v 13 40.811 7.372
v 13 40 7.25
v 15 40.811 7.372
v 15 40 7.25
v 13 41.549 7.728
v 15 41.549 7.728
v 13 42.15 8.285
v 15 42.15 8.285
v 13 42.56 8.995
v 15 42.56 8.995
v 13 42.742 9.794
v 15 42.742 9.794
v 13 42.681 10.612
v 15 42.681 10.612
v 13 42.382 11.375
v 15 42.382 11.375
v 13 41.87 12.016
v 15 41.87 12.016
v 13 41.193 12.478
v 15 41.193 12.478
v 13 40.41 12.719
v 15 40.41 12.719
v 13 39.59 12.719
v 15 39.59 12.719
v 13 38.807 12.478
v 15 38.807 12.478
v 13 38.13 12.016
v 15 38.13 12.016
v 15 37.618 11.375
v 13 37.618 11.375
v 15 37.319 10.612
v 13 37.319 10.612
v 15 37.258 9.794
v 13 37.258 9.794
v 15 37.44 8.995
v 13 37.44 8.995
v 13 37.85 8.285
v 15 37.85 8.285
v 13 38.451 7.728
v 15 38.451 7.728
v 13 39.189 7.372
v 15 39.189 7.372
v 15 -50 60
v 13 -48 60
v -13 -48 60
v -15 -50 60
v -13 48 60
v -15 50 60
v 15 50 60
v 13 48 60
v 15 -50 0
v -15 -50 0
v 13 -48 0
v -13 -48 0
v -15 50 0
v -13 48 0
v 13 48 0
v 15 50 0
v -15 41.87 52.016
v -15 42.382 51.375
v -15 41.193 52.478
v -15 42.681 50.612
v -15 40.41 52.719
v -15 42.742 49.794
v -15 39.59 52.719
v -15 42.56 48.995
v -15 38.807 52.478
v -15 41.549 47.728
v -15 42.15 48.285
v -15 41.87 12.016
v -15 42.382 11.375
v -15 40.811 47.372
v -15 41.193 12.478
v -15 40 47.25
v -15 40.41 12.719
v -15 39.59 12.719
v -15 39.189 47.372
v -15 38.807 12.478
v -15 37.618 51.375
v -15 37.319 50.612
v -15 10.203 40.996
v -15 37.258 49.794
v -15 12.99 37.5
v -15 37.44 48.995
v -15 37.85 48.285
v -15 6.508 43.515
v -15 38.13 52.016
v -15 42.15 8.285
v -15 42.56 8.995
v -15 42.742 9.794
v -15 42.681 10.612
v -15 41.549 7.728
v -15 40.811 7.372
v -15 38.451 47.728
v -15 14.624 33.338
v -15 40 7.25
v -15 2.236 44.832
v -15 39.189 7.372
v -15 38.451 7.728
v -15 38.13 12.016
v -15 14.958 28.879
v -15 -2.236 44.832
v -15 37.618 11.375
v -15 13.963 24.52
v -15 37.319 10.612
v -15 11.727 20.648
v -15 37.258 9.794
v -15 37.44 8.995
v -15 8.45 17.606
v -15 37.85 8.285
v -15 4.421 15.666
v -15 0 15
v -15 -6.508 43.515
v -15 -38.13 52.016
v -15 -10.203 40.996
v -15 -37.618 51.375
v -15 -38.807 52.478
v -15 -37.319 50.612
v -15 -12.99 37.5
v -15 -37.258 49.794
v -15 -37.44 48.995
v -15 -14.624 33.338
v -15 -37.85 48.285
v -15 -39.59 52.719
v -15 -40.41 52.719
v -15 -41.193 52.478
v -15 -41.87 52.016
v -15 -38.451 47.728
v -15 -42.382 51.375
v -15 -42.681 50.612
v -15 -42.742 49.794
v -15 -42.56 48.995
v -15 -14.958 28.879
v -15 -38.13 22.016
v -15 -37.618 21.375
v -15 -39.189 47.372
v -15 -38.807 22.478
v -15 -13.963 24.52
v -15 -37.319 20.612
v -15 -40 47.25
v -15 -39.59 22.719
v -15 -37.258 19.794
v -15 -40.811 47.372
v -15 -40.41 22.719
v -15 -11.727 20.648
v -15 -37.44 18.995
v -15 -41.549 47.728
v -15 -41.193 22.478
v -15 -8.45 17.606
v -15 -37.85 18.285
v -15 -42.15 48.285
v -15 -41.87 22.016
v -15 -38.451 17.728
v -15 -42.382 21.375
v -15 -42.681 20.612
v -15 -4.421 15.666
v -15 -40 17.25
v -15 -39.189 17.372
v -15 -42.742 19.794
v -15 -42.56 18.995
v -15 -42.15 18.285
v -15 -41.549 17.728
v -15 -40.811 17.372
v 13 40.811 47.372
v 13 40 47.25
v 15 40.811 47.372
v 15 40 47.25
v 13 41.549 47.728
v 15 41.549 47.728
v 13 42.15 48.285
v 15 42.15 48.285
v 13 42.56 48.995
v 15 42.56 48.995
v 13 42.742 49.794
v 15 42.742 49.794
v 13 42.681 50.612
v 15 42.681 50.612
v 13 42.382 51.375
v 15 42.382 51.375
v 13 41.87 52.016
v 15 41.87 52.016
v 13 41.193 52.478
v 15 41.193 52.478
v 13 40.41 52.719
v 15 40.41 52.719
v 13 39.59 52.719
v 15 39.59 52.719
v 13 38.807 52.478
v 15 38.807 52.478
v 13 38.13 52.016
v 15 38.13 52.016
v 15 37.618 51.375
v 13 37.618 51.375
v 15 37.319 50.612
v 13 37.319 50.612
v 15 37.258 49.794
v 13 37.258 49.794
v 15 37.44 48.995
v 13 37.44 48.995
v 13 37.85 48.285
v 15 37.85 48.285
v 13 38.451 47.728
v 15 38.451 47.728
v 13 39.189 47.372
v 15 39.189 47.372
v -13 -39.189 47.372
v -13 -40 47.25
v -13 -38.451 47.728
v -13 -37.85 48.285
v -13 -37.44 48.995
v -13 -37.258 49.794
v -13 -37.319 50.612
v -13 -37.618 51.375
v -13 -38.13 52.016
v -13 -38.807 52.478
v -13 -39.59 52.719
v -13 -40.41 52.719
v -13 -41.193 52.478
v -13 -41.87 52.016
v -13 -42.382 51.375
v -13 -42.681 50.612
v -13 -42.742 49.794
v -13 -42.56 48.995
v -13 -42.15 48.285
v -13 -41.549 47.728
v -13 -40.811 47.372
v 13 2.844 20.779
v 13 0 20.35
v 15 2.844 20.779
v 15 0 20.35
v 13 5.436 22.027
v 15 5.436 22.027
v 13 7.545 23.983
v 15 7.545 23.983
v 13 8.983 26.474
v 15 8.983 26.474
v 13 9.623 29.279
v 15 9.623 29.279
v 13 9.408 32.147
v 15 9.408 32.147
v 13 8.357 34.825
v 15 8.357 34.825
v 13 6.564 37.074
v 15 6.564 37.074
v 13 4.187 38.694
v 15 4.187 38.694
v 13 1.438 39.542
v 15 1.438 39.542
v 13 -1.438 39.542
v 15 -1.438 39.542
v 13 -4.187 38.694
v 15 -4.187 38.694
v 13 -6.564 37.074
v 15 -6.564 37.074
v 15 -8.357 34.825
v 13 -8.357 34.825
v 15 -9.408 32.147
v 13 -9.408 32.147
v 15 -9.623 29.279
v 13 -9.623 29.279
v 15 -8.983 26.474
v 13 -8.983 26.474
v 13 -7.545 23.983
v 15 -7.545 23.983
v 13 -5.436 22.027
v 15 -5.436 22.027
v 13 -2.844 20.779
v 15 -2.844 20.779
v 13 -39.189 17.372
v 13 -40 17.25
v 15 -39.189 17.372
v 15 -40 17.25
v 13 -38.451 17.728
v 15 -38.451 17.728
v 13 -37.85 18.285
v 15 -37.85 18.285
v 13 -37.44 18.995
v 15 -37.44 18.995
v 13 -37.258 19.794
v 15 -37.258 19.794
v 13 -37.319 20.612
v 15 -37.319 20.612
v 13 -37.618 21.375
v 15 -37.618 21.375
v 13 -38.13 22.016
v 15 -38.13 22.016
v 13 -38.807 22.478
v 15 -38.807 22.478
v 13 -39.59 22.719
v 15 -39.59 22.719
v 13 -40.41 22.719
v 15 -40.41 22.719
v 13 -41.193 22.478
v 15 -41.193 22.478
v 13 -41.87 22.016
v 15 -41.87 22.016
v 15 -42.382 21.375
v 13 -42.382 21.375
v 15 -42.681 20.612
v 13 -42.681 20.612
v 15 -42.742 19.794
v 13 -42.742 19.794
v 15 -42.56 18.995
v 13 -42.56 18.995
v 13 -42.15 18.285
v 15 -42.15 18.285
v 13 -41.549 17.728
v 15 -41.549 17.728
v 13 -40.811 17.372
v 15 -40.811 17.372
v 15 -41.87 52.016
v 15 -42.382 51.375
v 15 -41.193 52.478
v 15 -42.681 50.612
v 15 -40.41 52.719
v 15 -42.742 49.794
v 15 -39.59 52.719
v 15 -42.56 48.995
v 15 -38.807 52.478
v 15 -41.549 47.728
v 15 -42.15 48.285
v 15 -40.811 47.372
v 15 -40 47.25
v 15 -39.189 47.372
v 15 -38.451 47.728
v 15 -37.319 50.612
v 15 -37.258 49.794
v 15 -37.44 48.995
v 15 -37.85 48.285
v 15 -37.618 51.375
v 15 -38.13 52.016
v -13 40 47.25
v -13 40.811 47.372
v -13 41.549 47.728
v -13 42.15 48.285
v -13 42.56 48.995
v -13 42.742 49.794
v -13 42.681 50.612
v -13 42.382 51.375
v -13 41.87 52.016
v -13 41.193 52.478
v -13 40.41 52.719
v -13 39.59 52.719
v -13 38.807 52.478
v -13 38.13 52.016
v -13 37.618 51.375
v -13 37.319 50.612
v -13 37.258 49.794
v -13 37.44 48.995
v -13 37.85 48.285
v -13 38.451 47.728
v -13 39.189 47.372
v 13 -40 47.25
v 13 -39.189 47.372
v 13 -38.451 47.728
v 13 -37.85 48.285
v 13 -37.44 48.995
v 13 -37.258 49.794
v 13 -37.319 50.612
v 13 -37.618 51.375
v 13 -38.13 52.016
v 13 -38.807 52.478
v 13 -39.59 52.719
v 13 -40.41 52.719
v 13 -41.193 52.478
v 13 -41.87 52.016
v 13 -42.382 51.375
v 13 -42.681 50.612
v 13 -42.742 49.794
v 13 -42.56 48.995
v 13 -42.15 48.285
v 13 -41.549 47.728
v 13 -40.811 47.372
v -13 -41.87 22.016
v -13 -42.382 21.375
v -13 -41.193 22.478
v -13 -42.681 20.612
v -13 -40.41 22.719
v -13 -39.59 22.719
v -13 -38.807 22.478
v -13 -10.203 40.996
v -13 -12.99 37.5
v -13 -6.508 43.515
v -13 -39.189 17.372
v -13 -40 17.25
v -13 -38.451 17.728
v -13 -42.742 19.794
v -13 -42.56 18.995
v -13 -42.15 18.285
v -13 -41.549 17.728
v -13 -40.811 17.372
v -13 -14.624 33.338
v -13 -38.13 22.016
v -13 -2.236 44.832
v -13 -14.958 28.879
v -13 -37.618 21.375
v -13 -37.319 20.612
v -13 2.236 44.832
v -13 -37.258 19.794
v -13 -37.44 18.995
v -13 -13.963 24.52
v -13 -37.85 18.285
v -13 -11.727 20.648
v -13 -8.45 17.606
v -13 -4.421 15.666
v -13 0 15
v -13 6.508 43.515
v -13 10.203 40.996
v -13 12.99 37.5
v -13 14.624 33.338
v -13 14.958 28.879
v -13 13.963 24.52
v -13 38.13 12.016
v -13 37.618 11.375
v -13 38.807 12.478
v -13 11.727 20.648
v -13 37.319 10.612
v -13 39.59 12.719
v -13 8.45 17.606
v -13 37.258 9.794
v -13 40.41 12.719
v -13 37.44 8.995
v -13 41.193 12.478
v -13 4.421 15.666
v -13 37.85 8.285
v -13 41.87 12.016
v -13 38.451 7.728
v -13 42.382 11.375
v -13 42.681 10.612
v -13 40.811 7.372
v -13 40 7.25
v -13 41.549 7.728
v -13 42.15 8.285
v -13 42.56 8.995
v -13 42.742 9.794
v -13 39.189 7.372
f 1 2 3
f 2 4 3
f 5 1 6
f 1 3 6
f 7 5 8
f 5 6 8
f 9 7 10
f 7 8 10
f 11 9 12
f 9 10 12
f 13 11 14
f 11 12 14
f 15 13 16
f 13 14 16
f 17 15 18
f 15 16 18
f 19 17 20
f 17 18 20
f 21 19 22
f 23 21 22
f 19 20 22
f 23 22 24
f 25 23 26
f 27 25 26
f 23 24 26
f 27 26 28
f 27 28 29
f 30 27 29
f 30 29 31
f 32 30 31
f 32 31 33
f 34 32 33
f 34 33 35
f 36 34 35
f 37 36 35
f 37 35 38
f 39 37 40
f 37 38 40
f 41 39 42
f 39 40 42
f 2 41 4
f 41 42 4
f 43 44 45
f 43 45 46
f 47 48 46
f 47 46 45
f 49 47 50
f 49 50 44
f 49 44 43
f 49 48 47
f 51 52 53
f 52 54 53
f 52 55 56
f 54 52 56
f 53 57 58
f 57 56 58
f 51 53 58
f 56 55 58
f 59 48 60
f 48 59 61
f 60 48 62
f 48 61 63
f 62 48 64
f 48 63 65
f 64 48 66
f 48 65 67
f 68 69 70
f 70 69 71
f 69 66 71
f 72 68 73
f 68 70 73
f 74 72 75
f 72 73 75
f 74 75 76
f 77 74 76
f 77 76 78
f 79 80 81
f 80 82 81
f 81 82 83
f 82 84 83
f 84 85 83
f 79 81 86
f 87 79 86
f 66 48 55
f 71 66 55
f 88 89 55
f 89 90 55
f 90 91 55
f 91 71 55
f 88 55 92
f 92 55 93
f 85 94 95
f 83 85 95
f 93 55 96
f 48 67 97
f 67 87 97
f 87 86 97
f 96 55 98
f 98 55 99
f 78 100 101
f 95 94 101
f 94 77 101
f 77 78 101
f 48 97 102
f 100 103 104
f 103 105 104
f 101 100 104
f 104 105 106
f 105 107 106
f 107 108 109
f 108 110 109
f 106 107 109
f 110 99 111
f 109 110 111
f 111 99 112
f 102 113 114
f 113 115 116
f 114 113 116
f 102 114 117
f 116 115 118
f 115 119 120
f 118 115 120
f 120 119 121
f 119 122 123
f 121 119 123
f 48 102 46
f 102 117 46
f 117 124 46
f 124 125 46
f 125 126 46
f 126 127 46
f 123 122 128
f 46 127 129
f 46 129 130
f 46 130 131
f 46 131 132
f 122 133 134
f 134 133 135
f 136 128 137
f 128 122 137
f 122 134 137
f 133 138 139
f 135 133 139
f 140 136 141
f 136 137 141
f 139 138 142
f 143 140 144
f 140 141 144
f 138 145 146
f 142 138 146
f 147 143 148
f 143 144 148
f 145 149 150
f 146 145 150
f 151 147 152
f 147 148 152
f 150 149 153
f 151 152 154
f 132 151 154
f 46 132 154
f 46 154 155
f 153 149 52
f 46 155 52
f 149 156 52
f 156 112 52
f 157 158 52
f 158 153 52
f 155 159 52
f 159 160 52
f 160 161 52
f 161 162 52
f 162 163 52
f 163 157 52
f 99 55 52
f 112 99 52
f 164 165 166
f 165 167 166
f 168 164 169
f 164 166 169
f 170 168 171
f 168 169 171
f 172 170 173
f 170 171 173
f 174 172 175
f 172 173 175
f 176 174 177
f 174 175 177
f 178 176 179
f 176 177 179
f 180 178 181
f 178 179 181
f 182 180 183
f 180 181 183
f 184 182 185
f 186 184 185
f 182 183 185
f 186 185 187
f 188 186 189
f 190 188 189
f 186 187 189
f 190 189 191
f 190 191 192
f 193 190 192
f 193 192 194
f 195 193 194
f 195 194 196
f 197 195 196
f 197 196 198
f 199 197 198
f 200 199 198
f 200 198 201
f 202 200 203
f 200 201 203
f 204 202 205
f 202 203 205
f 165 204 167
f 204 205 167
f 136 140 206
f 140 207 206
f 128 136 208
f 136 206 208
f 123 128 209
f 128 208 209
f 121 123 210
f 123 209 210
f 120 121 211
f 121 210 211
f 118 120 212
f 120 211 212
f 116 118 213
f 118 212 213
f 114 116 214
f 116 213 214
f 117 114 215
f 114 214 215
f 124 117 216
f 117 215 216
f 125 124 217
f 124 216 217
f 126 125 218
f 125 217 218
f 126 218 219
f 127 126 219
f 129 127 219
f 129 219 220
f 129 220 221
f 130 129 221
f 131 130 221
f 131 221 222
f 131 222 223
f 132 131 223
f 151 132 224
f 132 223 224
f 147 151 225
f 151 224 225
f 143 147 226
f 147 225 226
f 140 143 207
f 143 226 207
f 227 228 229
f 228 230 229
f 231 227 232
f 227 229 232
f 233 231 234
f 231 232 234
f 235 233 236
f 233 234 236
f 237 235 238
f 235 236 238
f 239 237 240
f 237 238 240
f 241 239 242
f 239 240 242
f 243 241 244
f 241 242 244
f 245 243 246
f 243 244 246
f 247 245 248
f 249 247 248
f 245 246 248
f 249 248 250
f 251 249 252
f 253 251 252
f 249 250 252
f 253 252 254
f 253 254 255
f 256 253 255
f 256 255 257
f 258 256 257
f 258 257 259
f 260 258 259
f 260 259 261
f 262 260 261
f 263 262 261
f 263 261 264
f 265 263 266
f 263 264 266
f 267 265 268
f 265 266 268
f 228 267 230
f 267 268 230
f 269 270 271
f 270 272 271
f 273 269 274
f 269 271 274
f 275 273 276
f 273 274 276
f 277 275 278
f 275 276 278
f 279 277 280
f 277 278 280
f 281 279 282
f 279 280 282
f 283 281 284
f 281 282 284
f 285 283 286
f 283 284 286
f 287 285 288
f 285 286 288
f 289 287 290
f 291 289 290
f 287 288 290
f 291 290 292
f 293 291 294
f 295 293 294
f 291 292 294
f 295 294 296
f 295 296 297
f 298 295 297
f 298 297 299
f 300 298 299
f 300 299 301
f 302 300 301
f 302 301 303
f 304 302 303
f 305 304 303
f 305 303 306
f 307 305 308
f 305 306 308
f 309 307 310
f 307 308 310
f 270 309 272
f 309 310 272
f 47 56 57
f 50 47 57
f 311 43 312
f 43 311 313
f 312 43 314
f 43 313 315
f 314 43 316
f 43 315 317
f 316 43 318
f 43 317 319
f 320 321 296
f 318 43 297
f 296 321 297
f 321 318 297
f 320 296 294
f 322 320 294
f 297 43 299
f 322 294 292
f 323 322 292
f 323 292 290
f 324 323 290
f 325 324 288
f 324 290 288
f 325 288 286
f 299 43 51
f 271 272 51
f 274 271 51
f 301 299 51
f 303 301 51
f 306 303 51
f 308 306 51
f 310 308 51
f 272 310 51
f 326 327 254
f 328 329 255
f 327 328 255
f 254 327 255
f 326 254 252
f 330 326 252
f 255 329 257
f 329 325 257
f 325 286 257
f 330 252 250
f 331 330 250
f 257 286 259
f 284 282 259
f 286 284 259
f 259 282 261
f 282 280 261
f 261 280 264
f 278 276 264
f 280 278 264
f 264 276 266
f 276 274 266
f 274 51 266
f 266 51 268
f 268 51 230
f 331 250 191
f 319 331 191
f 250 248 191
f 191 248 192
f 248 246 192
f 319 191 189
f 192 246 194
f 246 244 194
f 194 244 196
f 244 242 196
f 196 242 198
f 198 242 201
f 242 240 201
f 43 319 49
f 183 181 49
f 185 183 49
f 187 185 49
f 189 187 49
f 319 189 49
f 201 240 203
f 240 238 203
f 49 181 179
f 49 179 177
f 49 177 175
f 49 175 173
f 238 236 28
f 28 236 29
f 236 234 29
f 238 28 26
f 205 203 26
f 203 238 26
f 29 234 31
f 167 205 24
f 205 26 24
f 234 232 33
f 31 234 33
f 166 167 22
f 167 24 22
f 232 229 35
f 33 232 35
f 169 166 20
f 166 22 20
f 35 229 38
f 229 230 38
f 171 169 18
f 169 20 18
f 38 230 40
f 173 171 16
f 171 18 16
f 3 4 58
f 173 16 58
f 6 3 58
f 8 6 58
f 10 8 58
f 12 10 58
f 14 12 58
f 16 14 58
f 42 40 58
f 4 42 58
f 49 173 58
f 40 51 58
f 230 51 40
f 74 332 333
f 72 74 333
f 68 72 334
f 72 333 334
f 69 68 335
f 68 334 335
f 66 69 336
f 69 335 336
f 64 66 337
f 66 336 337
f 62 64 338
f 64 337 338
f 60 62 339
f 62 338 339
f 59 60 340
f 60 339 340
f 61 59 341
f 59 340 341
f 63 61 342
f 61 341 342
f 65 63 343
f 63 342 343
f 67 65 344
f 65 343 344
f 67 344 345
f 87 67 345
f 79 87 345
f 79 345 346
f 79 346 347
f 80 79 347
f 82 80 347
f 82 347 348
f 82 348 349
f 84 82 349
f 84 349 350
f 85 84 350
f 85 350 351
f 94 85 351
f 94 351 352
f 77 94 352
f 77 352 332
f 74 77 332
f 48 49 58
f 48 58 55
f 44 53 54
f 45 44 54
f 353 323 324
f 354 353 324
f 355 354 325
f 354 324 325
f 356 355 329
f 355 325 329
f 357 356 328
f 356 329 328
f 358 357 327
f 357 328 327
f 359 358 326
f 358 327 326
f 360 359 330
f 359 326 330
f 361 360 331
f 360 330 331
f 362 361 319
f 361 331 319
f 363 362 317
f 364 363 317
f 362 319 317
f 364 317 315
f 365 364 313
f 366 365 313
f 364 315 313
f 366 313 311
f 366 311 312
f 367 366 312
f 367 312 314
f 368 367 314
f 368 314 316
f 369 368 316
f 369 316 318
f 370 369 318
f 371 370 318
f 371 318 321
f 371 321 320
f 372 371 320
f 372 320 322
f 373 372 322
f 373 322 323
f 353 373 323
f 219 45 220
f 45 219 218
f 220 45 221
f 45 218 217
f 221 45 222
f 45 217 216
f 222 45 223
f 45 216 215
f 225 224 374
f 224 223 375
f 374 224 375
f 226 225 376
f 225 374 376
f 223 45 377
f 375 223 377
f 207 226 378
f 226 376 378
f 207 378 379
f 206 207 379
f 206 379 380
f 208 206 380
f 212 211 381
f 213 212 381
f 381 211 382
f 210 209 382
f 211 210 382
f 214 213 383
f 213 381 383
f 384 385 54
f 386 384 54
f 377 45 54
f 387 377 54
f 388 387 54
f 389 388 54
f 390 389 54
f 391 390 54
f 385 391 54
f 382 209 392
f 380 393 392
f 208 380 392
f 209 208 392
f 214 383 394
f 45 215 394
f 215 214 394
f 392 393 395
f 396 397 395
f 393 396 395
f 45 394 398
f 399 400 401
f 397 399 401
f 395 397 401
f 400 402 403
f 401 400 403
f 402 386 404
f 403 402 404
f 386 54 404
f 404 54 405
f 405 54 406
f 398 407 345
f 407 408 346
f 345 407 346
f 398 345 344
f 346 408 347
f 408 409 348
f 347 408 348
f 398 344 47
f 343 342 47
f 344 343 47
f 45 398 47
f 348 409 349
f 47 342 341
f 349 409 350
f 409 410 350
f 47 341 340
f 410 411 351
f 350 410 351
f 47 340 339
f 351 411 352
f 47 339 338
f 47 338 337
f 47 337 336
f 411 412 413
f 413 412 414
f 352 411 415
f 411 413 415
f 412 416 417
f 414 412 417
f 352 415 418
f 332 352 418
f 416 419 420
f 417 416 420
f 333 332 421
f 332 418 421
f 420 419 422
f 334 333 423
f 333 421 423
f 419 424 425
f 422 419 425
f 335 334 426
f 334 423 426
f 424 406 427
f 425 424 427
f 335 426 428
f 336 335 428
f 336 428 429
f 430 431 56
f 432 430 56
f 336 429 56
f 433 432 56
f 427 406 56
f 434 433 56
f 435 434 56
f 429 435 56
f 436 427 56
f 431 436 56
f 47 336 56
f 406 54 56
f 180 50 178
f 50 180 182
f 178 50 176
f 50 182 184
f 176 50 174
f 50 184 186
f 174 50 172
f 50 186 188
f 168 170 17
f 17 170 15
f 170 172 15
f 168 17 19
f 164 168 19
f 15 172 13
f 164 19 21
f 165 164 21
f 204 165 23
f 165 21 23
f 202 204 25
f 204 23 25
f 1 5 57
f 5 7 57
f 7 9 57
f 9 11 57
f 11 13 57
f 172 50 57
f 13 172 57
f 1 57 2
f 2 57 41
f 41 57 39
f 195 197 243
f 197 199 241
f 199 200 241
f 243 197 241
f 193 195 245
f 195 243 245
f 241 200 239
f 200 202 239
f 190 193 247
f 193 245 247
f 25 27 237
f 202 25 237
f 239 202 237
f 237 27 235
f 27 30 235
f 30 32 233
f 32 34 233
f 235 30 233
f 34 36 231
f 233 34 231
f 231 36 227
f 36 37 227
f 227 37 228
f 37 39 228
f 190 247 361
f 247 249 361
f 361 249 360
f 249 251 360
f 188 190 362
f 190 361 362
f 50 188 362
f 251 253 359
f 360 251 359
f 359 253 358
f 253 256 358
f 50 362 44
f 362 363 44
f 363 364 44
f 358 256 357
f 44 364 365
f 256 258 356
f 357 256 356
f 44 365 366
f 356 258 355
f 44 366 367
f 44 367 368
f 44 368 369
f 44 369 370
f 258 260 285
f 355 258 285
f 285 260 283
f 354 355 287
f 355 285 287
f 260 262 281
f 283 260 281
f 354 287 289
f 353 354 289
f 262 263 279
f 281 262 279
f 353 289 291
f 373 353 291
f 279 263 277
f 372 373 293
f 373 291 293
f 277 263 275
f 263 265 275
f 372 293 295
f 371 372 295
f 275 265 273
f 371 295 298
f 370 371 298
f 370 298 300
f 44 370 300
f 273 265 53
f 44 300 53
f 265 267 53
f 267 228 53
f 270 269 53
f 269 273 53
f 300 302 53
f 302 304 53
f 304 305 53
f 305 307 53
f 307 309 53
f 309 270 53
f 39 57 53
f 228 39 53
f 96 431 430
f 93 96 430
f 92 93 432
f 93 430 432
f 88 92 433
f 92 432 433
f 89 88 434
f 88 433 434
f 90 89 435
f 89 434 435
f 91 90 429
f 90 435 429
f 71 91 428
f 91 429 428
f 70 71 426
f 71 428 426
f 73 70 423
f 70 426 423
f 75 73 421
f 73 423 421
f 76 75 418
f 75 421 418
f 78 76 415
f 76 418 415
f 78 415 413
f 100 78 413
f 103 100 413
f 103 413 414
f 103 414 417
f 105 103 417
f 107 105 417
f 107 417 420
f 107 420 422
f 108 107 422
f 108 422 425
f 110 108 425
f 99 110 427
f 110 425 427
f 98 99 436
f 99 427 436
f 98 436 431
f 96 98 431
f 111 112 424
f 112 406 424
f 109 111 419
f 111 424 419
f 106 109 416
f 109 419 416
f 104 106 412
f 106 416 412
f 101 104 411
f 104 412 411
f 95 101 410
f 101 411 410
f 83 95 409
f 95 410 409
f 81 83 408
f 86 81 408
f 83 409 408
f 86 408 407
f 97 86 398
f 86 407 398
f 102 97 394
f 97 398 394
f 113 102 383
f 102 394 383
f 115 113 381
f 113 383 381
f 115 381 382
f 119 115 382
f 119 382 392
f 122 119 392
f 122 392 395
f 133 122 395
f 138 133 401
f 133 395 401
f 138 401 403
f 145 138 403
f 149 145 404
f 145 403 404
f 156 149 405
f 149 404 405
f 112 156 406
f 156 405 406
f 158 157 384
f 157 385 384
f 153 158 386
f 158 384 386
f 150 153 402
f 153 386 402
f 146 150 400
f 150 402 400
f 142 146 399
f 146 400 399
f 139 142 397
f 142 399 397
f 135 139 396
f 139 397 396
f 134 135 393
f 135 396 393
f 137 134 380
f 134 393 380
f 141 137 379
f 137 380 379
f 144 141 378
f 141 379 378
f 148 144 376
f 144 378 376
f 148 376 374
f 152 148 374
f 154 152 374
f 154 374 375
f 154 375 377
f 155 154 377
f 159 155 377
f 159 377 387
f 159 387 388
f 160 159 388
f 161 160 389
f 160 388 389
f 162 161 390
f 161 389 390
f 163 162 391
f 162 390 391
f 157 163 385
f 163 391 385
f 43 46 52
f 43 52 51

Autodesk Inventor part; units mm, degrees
ref_plane "YZ Plane" through (0, 0, 0) normal (1, 0, 0) x (0, 1, 0)
ref_plane "XZ Plane" through (0, 0, 0) normal (0, 1, 0) x (-1, 0, 0)
ref_plane "XY Plane" through (0, 0, 0) normal (0, 0, 1) x (1, 0, 0)
sketch "Sketch1" plane through (0, 0, 0) normal (0, 0, 1) x (1, 0, 0)
  line L0 (-15, -50) -> (15, -50)
  line L1 (15, -50) -> (15, 50)
  line L2 (15, 50) -> (-15, 50)
  line L3 (-15, 50) -> (-15, -50)
  line L4 (-15, -50) -> (15, 50) construction
  line L5 (15, -50) -> (-15, 50) construction
  line L6 (-13, 48) -> (13, 48)
  line L7 (13, 48) -> (13, -48)
  line L8 (13, -48) -> (-13, -48)
  line L9 (-13, -48) -> (-13, 48)
  point P0 (0, 0)
  dimension "d0" = 30
  dimension "d1" = 100
  dimension "d2" = 2
extrude "Extrusion1" add sketch "Sketch1" along normal blind 60
sketch "Sketch2" plane through (15, -50, 0) normal (1, 0, 0) x (0, 0, -1)
  circle A0 centre (-30, 50) radius 9.65
  line L0 (-30, 100) -> (-30, 50) construction
  line L1 (0, 0) -> (0, 100) projected
  line L2 (0, 100) -> (-60, 100) projected
  line L3 (-30, 50) -> (0, 50) construction
  circle A1 centre (-50, 90) radius 2.75
  circle A2 centre (-10, 90) radius 2.75
  circle A3 centre (-20, 10) radius 2.75
  circle A4 centre (-50, 10) radius 2.75
  line L4 (0, 0) -> (-60, 0) projected
  dimension "d5" = 19.3
  dimension "d11" = 50
  dimension "d12" = 30
  dimension "d13" = 5.5
  dimension "d14" = 5.5
  dimension "d15" = 5.5
  dimension "d16" = 5.5
  dimension "d18" = 40
  dimension "d19" = 20
  dimension "d20" = 40
  dimension "d21" = 10
  dimension "d22" = 80
  dimension "d23" = 80
  dimension "d24" = 30
  dimension "d25" = 40
extrude "Extrusion2" cut sketch "Sketch2" against normal blind 38.5
sketch "Sketch3" plane through (-13, -48, 0) normal (1, 0, 0) x (0, 0, -1)
  circle A0 centre (-30, 48) radius 9.65 projected
  circle A1 centre (-30, 48) radius 15
  point P0 (0, 48)
  dimension "d8" = 30
extrude "Extrusion3" cut sketch "Sketch3" against normal blind 2 contours A0 | A1
properties part number "transmition Axle Support"
